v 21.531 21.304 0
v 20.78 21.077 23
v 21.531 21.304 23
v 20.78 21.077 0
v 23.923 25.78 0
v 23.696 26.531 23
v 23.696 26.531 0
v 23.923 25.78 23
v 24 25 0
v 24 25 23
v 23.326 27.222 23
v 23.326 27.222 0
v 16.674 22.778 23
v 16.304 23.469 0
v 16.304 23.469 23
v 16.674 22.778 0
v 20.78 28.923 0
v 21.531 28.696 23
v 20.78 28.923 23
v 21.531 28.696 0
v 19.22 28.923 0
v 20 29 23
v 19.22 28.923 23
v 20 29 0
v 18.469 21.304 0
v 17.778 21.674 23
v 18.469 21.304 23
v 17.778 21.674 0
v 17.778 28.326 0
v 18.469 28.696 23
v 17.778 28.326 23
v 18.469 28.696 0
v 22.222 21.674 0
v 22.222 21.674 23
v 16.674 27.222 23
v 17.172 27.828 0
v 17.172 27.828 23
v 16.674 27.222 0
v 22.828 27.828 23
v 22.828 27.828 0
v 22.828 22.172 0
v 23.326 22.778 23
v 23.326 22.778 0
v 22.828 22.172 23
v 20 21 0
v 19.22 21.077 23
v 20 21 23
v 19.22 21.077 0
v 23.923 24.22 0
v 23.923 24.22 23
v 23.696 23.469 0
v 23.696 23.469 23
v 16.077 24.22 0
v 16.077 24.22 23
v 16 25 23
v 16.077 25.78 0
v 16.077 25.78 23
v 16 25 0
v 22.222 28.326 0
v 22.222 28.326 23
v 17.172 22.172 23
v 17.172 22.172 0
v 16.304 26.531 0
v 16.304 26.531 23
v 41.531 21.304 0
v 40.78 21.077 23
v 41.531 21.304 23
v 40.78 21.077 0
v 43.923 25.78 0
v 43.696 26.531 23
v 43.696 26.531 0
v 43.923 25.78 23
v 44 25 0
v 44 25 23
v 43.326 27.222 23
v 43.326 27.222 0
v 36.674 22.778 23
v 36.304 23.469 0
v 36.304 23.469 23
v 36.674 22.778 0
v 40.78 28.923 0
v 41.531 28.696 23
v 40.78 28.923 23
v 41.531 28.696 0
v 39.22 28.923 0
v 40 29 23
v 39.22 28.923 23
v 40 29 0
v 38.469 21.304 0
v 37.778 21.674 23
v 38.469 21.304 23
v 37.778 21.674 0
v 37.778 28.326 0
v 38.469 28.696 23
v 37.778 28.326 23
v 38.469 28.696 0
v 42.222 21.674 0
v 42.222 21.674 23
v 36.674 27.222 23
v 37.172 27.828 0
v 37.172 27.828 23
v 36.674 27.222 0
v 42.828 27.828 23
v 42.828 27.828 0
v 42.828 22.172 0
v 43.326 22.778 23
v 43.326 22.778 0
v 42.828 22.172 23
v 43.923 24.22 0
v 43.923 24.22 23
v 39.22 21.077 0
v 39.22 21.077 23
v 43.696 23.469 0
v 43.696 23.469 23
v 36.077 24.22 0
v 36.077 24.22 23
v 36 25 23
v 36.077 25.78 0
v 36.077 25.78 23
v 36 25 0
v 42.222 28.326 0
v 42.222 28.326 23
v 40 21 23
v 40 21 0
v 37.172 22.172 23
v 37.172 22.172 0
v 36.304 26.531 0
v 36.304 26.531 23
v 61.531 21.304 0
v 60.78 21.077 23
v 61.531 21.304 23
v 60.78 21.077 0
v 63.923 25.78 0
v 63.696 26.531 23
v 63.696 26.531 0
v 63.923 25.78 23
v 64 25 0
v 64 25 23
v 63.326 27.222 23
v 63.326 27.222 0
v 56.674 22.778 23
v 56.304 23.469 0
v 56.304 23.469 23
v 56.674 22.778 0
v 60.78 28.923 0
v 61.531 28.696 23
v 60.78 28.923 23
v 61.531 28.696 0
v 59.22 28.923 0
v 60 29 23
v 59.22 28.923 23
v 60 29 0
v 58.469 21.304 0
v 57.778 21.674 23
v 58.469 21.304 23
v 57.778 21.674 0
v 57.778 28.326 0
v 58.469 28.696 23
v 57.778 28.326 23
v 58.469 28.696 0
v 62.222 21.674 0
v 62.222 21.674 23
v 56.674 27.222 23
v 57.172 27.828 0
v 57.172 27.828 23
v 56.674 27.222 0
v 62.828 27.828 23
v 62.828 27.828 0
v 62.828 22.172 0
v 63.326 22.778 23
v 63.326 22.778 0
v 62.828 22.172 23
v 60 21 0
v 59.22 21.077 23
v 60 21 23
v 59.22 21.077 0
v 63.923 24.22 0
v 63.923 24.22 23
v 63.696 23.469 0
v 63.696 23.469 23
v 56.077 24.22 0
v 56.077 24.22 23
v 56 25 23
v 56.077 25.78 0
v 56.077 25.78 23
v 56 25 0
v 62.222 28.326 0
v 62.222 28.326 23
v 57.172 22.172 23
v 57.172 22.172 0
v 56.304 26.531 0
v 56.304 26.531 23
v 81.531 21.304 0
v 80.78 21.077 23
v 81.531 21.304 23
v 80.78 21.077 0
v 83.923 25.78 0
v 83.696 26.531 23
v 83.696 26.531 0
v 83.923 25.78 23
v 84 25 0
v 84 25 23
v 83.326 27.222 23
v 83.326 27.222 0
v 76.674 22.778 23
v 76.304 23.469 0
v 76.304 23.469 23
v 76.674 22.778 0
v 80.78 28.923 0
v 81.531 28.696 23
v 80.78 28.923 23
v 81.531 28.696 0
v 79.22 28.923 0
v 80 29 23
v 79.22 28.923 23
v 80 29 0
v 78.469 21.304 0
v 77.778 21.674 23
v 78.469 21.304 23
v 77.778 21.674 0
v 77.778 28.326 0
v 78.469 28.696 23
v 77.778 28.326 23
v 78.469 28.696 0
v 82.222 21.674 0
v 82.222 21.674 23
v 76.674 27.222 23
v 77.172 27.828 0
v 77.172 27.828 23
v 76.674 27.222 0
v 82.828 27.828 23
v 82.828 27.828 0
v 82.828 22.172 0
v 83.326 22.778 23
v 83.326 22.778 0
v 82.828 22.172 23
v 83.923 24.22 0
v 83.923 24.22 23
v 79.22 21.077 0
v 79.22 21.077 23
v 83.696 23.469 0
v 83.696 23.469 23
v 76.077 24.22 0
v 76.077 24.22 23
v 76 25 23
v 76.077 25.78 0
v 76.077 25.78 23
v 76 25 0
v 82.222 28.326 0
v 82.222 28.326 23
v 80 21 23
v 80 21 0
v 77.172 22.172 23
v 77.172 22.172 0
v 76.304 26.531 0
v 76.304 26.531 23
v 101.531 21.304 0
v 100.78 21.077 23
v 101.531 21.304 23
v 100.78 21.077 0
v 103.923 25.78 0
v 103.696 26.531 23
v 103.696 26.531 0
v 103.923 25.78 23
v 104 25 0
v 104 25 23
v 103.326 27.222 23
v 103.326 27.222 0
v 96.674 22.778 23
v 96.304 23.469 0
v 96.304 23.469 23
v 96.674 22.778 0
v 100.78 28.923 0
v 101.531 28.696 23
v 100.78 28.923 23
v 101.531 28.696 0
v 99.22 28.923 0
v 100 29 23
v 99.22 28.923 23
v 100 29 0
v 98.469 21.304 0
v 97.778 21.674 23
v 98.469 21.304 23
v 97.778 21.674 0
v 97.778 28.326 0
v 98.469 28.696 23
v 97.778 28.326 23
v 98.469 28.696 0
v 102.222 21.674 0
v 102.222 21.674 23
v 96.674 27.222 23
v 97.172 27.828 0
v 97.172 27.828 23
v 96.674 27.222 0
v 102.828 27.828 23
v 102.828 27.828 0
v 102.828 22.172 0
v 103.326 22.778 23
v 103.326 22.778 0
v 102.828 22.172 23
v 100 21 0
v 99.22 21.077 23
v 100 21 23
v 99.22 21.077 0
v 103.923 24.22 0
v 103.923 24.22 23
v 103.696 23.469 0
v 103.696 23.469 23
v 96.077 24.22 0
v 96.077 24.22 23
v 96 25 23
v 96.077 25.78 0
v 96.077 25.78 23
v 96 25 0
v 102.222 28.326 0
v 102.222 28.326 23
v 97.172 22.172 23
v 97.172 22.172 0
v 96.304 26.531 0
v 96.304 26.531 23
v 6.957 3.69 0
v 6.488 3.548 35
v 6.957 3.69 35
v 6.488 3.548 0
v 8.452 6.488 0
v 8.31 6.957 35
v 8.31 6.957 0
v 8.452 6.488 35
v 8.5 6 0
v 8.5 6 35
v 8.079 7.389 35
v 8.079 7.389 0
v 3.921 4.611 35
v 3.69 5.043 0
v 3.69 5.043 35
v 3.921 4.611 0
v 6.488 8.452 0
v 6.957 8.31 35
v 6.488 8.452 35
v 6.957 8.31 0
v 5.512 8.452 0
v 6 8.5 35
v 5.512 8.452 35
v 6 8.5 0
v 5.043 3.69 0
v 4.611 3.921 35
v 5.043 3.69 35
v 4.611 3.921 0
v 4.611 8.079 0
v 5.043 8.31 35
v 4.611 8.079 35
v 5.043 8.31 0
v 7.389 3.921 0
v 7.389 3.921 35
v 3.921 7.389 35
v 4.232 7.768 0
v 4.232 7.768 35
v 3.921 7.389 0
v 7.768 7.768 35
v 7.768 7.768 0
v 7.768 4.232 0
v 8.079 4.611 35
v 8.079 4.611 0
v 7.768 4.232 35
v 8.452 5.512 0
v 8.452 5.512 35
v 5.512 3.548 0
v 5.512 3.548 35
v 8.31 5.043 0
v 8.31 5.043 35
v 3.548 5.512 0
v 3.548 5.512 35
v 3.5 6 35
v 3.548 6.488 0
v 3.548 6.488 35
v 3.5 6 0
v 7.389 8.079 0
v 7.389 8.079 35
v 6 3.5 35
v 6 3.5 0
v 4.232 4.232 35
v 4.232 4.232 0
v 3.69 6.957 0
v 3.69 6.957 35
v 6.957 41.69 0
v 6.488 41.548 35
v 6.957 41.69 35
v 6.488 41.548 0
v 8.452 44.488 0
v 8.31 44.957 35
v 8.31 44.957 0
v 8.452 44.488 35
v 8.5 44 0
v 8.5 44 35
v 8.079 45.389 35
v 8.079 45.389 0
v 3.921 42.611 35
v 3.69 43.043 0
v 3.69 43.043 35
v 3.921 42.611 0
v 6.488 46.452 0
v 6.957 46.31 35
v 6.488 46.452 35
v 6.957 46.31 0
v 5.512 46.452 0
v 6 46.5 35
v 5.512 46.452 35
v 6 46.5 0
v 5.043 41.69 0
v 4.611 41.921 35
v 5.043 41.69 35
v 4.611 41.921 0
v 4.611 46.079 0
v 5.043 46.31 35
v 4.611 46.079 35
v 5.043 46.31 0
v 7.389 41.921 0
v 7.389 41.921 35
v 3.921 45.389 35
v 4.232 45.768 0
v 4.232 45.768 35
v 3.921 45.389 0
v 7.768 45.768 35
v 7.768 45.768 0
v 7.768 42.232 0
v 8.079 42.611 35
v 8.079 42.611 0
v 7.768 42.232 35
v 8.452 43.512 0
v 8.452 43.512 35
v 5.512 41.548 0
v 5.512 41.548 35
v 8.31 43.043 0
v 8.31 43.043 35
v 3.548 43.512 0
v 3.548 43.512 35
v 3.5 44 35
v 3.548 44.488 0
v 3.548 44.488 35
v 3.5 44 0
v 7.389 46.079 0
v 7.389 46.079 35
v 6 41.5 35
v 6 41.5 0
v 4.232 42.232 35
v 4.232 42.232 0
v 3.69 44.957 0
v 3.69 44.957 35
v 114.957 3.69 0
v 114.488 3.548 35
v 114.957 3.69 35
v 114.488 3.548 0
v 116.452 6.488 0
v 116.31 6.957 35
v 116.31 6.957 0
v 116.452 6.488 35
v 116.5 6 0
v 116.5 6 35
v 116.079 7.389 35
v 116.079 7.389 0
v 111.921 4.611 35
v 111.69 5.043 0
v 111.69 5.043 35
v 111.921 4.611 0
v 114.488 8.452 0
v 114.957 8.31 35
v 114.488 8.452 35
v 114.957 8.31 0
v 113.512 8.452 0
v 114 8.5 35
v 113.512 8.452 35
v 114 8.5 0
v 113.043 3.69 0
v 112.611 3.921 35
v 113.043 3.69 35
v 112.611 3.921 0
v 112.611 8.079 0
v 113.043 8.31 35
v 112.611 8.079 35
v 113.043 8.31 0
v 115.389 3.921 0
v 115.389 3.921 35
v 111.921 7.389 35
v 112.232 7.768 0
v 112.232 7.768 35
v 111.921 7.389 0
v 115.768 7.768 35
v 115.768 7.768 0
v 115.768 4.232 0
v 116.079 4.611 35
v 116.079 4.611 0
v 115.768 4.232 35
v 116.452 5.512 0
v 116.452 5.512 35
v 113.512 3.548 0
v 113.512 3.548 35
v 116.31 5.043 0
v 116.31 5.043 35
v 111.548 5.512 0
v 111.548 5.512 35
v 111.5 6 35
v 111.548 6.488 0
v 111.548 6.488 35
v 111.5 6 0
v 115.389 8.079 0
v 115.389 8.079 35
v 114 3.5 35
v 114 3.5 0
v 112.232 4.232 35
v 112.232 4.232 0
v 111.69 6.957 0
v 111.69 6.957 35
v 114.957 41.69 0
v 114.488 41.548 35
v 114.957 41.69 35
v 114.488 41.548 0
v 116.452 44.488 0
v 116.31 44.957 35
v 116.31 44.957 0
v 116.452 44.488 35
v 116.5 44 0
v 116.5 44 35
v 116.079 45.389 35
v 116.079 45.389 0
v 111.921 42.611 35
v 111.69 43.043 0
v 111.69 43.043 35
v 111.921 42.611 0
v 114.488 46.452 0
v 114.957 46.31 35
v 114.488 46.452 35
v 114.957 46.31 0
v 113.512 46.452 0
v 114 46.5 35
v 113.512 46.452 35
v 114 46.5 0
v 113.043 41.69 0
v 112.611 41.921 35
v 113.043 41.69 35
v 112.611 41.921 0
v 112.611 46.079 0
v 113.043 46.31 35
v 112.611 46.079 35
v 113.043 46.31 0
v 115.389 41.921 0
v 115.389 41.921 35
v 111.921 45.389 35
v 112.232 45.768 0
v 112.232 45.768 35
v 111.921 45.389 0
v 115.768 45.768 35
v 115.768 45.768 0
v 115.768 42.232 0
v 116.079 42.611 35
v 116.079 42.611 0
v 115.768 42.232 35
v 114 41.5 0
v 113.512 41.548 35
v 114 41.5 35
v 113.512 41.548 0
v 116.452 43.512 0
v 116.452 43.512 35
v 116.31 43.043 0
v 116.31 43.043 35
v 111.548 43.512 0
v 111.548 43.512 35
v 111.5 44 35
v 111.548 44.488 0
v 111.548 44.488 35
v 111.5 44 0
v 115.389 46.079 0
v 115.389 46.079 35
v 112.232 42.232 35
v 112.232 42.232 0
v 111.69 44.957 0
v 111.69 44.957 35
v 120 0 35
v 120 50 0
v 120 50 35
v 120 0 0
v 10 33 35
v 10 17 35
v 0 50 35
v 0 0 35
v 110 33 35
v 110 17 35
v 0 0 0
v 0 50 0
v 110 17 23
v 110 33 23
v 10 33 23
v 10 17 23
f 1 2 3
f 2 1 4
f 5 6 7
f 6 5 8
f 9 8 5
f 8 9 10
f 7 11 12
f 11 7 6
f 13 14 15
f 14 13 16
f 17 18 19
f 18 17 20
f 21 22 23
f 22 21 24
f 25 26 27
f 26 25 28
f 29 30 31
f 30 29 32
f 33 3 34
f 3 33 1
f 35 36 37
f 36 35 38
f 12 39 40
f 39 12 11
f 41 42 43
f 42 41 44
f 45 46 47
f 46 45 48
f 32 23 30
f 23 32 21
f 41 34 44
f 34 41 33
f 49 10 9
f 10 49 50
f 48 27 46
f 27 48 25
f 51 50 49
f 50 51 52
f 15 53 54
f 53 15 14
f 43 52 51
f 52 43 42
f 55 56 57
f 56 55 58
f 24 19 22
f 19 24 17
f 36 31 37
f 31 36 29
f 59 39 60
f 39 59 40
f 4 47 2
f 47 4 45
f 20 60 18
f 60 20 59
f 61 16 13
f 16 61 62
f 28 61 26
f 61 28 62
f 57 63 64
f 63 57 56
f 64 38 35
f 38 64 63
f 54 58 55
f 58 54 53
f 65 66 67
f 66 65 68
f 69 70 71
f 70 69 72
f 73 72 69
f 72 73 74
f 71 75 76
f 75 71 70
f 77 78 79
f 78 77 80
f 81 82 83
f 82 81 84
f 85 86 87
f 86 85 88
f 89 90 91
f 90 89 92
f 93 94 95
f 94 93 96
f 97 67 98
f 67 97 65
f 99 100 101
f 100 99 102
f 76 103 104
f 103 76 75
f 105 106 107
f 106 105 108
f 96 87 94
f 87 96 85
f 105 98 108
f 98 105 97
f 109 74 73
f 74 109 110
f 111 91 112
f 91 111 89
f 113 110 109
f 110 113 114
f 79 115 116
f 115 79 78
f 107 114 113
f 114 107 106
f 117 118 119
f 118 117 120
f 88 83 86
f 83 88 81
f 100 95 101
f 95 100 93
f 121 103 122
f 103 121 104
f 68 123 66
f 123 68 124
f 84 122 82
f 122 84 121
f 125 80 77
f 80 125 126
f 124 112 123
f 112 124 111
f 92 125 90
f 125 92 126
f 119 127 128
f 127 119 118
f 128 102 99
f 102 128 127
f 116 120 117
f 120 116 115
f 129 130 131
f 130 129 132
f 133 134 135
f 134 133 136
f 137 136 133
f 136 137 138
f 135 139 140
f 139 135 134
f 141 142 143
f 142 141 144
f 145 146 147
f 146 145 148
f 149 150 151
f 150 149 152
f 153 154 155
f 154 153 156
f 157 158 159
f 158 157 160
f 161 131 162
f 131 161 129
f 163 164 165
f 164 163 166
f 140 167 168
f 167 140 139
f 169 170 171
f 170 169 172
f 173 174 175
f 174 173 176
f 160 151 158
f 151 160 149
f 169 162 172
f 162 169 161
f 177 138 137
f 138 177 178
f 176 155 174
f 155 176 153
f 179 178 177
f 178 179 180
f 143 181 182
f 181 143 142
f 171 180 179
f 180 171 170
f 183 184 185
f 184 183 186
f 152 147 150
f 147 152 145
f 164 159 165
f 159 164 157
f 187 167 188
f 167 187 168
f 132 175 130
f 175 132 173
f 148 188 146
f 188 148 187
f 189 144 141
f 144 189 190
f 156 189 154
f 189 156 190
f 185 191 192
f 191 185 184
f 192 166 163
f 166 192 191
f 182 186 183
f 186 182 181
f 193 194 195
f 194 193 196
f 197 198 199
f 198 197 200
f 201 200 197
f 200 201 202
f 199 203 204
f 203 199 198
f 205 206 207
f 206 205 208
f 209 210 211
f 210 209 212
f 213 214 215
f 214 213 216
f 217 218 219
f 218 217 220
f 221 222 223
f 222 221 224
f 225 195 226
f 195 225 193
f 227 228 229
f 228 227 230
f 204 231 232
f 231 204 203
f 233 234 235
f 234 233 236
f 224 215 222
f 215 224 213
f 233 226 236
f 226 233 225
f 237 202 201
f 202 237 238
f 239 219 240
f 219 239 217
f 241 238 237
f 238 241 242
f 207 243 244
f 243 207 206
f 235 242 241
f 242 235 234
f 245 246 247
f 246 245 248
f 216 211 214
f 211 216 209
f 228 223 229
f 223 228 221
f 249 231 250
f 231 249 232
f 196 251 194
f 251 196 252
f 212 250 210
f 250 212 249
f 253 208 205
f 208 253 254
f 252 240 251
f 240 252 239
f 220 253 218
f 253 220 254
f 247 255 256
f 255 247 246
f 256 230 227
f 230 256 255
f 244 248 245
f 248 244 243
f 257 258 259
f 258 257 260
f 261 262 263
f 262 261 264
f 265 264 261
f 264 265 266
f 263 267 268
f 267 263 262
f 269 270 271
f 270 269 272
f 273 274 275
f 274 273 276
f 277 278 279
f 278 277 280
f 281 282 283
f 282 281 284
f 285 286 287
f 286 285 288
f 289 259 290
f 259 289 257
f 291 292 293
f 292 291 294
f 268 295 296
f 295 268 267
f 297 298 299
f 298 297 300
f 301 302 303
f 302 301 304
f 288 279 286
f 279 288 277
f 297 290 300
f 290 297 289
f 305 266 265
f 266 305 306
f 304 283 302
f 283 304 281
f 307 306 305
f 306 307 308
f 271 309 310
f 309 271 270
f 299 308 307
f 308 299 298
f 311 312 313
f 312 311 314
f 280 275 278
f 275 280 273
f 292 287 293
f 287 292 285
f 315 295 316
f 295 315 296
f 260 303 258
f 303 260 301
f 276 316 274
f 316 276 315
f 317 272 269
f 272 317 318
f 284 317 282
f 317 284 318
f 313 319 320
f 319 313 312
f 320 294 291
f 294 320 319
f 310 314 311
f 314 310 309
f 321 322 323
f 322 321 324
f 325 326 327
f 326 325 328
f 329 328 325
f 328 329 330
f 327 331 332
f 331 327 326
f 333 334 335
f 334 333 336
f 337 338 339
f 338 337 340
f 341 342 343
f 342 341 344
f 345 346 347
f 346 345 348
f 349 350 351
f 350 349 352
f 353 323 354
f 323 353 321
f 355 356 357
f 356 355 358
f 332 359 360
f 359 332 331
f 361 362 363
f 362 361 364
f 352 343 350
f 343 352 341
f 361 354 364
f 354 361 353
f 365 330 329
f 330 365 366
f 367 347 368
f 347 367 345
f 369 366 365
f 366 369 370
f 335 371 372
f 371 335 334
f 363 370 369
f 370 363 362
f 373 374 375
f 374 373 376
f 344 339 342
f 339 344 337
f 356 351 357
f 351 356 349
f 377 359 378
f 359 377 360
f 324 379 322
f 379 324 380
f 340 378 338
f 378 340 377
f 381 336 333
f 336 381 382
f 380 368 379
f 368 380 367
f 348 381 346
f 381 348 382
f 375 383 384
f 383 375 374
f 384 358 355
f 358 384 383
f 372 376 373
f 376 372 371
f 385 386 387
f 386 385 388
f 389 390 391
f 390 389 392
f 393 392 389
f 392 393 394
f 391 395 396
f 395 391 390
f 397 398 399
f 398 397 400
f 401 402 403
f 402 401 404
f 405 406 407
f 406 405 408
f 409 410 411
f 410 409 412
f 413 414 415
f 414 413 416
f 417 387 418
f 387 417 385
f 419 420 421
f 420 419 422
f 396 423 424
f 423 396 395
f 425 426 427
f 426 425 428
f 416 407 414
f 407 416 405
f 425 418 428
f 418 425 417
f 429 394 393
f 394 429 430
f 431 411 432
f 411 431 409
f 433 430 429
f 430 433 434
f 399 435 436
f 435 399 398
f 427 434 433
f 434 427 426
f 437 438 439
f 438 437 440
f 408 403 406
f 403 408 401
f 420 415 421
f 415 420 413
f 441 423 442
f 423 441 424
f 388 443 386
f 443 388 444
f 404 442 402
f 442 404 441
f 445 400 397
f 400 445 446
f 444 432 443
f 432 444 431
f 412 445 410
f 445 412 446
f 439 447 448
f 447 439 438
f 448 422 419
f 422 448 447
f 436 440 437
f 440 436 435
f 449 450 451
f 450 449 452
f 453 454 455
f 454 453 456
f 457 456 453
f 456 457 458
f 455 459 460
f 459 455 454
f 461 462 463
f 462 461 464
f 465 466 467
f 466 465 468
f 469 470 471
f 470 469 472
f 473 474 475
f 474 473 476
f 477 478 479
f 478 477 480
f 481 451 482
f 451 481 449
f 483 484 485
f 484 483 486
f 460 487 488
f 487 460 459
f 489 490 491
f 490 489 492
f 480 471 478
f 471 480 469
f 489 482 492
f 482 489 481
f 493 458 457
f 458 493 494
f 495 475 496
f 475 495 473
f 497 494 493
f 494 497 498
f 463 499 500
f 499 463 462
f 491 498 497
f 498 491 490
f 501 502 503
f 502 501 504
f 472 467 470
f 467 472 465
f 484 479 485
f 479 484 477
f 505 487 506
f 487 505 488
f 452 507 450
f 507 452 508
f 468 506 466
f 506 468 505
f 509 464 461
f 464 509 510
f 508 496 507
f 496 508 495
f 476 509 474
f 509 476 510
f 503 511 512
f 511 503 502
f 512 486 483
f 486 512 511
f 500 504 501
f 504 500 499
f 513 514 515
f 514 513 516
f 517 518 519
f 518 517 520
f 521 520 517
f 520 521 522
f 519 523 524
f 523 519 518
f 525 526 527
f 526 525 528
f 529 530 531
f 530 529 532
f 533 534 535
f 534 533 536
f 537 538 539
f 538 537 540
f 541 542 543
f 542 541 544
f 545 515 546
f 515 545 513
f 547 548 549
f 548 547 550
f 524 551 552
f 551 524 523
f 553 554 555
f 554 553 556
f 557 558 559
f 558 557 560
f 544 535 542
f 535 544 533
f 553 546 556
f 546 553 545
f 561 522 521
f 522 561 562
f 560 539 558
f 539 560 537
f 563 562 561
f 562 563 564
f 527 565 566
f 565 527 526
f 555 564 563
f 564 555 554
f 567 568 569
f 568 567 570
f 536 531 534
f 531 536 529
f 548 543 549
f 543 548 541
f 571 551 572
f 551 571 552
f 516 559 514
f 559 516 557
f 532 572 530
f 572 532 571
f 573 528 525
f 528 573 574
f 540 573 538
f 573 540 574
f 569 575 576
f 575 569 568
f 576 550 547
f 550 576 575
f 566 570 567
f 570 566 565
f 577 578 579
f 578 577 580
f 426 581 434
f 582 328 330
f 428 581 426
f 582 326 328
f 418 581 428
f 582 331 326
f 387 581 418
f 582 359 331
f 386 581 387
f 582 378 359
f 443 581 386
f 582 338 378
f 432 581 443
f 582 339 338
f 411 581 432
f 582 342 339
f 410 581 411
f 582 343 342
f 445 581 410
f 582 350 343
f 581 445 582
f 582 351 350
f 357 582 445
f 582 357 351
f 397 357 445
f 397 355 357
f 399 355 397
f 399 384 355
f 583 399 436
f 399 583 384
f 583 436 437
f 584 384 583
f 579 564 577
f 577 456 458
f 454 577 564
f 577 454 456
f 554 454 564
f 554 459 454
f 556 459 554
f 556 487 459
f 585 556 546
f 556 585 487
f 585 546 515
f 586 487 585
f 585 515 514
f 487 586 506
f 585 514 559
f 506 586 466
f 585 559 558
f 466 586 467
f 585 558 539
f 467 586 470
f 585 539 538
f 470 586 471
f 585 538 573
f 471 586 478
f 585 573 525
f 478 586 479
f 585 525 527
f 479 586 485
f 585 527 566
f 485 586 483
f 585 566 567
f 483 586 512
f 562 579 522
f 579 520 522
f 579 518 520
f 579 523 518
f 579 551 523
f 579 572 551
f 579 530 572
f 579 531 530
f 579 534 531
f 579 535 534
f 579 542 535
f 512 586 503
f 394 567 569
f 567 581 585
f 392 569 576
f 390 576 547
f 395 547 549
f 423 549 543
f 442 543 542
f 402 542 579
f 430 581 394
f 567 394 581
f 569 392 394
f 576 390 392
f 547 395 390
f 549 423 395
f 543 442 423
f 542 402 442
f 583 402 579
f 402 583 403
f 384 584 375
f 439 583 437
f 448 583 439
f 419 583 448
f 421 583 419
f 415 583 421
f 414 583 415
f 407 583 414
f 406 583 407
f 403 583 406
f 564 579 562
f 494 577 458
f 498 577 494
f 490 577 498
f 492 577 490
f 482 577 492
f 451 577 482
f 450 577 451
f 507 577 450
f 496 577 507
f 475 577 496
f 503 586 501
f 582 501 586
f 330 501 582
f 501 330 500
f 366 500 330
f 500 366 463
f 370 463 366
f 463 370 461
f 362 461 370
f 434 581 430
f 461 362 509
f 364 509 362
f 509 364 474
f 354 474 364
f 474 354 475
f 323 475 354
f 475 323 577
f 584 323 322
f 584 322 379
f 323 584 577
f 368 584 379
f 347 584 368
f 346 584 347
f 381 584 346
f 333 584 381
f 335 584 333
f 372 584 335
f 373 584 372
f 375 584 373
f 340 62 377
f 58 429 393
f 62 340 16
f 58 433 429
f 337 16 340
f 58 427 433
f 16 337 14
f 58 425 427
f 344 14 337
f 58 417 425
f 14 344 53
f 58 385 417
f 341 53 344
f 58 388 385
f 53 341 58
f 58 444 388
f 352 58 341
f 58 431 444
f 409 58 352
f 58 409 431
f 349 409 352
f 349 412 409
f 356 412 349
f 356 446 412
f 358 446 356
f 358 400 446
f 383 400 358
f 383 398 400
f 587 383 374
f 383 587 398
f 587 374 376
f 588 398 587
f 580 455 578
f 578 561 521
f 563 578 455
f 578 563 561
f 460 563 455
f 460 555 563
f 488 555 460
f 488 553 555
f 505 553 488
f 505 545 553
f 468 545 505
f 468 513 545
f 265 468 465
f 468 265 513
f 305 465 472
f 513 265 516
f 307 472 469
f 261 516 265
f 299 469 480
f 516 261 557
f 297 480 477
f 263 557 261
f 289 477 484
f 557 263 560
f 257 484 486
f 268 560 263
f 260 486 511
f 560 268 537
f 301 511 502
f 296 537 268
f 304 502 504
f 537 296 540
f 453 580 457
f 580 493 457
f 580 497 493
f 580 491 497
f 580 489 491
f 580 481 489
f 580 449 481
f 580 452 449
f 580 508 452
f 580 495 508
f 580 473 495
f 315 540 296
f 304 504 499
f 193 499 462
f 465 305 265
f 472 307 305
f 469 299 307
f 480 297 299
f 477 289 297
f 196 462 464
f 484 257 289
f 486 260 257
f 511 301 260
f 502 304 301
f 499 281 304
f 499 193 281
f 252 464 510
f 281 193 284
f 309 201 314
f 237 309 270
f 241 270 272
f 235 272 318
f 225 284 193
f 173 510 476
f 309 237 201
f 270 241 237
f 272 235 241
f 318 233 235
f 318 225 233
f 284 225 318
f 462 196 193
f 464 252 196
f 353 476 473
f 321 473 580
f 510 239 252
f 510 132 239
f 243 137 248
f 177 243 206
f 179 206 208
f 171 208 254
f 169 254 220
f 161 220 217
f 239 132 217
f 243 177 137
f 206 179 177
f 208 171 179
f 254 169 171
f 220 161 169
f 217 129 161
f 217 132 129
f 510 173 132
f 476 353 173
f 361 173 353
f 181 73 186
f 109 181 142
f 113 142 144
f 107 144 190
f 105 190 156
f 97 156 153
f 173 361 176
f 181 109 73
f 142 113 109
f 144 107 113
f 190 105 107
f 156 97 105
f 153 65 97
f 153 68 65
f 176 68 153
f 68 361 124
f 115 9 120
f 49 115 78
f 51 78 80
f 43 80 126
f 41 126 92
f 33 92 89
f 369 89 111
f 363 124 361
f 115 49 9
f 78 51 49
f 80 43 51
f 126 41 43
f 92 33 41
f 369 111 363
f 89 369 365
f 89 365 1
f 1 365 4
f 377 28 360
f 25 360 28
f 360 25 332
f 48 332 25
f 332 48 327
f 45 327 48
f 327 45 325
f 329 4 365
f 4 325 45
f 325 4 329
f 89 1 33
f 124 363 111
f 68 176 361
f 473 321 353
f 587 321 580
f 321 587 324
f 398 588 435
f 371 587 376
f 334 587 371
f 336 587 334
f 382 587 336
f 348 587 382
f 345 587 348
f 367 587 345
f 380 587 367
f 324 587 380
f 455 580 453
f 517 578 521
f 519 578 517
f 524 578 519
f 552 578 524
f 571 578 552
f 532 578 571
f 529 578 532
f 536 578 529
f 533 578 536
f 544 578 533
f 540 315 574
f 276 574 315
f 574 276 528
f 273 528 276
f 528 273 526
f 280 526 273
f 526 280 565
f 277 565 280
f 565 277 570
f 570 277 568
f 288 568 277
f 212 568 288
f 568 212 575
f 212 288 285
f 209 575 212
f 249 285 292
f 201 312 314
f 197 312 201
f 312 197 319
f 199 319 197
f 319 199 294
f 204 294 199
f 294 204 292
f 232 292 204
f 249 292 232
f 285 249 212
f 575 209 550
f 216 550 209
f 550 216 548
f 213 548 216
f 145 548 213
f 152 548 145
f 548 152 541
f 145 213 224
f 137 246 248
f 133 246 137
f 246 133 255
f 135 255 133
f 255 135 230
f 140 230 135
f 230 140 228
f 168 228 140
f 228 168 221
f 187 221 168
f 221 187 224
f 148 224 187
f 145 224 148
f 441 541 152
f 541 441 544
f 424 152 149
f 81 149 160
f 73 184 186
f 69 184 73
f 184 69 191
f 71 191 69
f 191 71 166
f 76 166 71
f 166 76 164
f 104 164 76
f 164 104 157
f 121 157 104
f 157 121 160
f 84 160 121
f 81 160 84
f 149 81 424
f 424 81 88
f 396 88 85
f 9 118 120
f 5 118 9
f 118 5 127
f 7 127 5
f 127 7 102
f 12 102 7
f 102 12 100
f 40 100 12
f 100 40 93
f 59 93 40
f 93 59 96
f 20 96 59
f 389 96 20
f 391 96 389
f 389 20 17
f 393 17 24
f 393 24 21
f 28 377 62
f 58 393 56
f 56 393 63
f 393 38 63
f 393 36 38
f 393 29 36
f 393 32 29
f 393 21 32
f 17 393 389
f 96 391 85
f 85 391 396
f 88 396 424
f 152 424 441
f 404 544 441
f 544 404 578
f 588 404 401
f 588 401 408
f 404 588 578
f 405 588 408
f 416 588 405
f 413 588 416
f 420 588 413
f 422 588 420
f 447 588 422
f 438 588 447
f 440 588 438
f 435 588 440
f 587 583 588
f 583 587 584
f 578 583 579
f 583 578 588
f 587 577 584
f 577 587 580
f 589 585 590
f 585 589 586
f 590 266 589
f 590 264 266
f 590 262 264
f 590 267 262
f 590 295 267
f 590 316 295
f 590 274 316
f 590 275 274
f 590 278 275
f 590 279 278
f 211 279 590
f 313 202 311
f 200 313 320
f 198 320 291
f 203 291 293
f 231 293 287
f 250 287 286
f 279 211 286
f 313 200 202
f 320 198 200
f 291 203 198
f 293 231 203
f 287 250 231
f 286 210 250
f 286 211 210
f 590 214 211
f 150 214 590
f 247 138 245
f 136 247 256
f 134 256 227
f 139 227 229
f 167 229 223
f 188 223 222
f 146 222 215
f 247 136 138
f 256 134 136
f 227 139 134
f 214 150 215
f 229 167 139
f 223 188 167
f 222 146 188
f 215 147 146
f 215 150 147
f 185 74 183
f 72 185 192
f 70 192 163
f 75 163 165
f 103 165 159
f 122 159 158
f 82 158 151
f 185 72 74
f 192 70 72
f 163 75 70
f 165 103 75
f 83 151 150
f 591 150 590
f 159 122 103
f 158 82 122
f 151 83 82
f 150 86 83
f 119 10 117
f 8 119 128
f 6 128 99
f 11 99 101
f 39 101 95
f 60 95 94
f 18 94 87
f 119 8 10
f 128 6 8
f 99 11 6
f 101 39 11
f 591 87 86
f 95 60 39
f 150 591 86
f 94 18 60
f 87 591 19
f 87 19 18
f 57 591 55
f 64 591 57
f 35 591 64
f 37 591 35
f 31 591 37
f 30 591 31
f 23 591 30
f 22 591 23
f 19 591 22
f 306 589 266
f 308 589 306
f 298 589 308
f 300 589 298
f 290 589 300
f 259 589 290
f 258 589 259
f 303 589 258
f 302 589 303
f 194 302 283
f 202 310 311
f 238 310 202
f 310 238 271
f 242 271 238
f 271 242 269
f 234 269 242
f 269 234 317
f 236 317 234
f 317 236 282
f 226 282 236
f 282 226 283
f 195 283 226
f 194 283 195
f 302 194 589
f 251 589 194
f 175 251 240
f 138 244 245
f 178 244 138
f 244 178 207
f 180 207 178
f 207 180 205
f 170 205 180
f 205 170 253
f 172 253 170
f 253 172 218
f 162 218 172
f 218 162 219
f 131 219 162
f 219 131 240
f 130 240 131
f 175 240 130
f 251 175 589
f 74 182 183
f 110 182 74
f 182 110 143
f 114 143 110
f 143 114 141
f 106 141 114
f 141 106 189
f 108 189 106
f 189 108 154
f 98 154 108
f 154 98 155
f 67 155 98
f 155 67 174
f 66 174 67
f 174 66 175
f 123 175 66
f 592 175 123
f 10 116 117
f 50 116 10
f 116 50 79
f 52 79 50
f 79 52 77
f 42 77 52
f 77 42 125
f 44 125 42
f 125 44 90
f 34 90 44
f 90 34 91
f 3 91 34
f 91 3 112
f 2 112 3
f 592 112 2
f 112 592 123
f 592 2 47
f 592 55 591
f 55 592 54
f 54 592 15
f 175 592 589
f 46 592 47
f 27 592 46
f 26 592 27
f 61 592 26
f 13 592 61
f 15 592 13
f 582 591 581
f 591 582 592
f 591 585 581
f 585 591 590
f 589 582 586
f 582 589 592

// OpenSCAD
$fn = 32;

// ----------------------------------------------------------------------
// Manifold block: gallery_top manifold
// ----------------------------------------------------------------------

// --- parameters (mm) ---
block_l = 120;            // block length, X
block_w = 50;             // block width, Y
block_h = 35;             // block height, Z
port_d = 8;               // port bore diameter
port_pitch = 20;          // port pitch along X
gallery_d = 16;           // top gallery width, Y
gallery_depth = 12;       // gallery pocket depth
wall_p = 10;              // gallery end wall thickness, X
mnt_d = 5;                // mounting hole diameter
mnt_in = 6;               // mounting hole inset from the edges
fit_tol = 0.1;            // tolerance for press fits, mm
free_tol = 0.5;           // tolerance for clearance fits, mm

n_ports = 5;  // ports in the row
port_x0 = (block_l - (n_ports - 1) * port_pitch) / 2;  // first port X

difference() {
  cube([block_l, block_w, block_h]);
  for (i = [0 : n_ports - 1])
    translate([port_x0 + i * port_pitch, block_w / 2, -1])
      cylinder(h = block_h + 2, d = port_d);
  translate([wall_p, block_w / 2 - gallery_d / 2, block_h - gallery_depth])
    cube([block_l - 2 * wall_p, gallery_d, gallery_depth + 1]);
  for (cx = [mnt_in, block_l - mnt_in])
    for (cy = [mnt_in, block_w - mnt_in])
      translate([cx, cy, -1]) cylinder(h = block_h + 2, d = mnt_d);
}
